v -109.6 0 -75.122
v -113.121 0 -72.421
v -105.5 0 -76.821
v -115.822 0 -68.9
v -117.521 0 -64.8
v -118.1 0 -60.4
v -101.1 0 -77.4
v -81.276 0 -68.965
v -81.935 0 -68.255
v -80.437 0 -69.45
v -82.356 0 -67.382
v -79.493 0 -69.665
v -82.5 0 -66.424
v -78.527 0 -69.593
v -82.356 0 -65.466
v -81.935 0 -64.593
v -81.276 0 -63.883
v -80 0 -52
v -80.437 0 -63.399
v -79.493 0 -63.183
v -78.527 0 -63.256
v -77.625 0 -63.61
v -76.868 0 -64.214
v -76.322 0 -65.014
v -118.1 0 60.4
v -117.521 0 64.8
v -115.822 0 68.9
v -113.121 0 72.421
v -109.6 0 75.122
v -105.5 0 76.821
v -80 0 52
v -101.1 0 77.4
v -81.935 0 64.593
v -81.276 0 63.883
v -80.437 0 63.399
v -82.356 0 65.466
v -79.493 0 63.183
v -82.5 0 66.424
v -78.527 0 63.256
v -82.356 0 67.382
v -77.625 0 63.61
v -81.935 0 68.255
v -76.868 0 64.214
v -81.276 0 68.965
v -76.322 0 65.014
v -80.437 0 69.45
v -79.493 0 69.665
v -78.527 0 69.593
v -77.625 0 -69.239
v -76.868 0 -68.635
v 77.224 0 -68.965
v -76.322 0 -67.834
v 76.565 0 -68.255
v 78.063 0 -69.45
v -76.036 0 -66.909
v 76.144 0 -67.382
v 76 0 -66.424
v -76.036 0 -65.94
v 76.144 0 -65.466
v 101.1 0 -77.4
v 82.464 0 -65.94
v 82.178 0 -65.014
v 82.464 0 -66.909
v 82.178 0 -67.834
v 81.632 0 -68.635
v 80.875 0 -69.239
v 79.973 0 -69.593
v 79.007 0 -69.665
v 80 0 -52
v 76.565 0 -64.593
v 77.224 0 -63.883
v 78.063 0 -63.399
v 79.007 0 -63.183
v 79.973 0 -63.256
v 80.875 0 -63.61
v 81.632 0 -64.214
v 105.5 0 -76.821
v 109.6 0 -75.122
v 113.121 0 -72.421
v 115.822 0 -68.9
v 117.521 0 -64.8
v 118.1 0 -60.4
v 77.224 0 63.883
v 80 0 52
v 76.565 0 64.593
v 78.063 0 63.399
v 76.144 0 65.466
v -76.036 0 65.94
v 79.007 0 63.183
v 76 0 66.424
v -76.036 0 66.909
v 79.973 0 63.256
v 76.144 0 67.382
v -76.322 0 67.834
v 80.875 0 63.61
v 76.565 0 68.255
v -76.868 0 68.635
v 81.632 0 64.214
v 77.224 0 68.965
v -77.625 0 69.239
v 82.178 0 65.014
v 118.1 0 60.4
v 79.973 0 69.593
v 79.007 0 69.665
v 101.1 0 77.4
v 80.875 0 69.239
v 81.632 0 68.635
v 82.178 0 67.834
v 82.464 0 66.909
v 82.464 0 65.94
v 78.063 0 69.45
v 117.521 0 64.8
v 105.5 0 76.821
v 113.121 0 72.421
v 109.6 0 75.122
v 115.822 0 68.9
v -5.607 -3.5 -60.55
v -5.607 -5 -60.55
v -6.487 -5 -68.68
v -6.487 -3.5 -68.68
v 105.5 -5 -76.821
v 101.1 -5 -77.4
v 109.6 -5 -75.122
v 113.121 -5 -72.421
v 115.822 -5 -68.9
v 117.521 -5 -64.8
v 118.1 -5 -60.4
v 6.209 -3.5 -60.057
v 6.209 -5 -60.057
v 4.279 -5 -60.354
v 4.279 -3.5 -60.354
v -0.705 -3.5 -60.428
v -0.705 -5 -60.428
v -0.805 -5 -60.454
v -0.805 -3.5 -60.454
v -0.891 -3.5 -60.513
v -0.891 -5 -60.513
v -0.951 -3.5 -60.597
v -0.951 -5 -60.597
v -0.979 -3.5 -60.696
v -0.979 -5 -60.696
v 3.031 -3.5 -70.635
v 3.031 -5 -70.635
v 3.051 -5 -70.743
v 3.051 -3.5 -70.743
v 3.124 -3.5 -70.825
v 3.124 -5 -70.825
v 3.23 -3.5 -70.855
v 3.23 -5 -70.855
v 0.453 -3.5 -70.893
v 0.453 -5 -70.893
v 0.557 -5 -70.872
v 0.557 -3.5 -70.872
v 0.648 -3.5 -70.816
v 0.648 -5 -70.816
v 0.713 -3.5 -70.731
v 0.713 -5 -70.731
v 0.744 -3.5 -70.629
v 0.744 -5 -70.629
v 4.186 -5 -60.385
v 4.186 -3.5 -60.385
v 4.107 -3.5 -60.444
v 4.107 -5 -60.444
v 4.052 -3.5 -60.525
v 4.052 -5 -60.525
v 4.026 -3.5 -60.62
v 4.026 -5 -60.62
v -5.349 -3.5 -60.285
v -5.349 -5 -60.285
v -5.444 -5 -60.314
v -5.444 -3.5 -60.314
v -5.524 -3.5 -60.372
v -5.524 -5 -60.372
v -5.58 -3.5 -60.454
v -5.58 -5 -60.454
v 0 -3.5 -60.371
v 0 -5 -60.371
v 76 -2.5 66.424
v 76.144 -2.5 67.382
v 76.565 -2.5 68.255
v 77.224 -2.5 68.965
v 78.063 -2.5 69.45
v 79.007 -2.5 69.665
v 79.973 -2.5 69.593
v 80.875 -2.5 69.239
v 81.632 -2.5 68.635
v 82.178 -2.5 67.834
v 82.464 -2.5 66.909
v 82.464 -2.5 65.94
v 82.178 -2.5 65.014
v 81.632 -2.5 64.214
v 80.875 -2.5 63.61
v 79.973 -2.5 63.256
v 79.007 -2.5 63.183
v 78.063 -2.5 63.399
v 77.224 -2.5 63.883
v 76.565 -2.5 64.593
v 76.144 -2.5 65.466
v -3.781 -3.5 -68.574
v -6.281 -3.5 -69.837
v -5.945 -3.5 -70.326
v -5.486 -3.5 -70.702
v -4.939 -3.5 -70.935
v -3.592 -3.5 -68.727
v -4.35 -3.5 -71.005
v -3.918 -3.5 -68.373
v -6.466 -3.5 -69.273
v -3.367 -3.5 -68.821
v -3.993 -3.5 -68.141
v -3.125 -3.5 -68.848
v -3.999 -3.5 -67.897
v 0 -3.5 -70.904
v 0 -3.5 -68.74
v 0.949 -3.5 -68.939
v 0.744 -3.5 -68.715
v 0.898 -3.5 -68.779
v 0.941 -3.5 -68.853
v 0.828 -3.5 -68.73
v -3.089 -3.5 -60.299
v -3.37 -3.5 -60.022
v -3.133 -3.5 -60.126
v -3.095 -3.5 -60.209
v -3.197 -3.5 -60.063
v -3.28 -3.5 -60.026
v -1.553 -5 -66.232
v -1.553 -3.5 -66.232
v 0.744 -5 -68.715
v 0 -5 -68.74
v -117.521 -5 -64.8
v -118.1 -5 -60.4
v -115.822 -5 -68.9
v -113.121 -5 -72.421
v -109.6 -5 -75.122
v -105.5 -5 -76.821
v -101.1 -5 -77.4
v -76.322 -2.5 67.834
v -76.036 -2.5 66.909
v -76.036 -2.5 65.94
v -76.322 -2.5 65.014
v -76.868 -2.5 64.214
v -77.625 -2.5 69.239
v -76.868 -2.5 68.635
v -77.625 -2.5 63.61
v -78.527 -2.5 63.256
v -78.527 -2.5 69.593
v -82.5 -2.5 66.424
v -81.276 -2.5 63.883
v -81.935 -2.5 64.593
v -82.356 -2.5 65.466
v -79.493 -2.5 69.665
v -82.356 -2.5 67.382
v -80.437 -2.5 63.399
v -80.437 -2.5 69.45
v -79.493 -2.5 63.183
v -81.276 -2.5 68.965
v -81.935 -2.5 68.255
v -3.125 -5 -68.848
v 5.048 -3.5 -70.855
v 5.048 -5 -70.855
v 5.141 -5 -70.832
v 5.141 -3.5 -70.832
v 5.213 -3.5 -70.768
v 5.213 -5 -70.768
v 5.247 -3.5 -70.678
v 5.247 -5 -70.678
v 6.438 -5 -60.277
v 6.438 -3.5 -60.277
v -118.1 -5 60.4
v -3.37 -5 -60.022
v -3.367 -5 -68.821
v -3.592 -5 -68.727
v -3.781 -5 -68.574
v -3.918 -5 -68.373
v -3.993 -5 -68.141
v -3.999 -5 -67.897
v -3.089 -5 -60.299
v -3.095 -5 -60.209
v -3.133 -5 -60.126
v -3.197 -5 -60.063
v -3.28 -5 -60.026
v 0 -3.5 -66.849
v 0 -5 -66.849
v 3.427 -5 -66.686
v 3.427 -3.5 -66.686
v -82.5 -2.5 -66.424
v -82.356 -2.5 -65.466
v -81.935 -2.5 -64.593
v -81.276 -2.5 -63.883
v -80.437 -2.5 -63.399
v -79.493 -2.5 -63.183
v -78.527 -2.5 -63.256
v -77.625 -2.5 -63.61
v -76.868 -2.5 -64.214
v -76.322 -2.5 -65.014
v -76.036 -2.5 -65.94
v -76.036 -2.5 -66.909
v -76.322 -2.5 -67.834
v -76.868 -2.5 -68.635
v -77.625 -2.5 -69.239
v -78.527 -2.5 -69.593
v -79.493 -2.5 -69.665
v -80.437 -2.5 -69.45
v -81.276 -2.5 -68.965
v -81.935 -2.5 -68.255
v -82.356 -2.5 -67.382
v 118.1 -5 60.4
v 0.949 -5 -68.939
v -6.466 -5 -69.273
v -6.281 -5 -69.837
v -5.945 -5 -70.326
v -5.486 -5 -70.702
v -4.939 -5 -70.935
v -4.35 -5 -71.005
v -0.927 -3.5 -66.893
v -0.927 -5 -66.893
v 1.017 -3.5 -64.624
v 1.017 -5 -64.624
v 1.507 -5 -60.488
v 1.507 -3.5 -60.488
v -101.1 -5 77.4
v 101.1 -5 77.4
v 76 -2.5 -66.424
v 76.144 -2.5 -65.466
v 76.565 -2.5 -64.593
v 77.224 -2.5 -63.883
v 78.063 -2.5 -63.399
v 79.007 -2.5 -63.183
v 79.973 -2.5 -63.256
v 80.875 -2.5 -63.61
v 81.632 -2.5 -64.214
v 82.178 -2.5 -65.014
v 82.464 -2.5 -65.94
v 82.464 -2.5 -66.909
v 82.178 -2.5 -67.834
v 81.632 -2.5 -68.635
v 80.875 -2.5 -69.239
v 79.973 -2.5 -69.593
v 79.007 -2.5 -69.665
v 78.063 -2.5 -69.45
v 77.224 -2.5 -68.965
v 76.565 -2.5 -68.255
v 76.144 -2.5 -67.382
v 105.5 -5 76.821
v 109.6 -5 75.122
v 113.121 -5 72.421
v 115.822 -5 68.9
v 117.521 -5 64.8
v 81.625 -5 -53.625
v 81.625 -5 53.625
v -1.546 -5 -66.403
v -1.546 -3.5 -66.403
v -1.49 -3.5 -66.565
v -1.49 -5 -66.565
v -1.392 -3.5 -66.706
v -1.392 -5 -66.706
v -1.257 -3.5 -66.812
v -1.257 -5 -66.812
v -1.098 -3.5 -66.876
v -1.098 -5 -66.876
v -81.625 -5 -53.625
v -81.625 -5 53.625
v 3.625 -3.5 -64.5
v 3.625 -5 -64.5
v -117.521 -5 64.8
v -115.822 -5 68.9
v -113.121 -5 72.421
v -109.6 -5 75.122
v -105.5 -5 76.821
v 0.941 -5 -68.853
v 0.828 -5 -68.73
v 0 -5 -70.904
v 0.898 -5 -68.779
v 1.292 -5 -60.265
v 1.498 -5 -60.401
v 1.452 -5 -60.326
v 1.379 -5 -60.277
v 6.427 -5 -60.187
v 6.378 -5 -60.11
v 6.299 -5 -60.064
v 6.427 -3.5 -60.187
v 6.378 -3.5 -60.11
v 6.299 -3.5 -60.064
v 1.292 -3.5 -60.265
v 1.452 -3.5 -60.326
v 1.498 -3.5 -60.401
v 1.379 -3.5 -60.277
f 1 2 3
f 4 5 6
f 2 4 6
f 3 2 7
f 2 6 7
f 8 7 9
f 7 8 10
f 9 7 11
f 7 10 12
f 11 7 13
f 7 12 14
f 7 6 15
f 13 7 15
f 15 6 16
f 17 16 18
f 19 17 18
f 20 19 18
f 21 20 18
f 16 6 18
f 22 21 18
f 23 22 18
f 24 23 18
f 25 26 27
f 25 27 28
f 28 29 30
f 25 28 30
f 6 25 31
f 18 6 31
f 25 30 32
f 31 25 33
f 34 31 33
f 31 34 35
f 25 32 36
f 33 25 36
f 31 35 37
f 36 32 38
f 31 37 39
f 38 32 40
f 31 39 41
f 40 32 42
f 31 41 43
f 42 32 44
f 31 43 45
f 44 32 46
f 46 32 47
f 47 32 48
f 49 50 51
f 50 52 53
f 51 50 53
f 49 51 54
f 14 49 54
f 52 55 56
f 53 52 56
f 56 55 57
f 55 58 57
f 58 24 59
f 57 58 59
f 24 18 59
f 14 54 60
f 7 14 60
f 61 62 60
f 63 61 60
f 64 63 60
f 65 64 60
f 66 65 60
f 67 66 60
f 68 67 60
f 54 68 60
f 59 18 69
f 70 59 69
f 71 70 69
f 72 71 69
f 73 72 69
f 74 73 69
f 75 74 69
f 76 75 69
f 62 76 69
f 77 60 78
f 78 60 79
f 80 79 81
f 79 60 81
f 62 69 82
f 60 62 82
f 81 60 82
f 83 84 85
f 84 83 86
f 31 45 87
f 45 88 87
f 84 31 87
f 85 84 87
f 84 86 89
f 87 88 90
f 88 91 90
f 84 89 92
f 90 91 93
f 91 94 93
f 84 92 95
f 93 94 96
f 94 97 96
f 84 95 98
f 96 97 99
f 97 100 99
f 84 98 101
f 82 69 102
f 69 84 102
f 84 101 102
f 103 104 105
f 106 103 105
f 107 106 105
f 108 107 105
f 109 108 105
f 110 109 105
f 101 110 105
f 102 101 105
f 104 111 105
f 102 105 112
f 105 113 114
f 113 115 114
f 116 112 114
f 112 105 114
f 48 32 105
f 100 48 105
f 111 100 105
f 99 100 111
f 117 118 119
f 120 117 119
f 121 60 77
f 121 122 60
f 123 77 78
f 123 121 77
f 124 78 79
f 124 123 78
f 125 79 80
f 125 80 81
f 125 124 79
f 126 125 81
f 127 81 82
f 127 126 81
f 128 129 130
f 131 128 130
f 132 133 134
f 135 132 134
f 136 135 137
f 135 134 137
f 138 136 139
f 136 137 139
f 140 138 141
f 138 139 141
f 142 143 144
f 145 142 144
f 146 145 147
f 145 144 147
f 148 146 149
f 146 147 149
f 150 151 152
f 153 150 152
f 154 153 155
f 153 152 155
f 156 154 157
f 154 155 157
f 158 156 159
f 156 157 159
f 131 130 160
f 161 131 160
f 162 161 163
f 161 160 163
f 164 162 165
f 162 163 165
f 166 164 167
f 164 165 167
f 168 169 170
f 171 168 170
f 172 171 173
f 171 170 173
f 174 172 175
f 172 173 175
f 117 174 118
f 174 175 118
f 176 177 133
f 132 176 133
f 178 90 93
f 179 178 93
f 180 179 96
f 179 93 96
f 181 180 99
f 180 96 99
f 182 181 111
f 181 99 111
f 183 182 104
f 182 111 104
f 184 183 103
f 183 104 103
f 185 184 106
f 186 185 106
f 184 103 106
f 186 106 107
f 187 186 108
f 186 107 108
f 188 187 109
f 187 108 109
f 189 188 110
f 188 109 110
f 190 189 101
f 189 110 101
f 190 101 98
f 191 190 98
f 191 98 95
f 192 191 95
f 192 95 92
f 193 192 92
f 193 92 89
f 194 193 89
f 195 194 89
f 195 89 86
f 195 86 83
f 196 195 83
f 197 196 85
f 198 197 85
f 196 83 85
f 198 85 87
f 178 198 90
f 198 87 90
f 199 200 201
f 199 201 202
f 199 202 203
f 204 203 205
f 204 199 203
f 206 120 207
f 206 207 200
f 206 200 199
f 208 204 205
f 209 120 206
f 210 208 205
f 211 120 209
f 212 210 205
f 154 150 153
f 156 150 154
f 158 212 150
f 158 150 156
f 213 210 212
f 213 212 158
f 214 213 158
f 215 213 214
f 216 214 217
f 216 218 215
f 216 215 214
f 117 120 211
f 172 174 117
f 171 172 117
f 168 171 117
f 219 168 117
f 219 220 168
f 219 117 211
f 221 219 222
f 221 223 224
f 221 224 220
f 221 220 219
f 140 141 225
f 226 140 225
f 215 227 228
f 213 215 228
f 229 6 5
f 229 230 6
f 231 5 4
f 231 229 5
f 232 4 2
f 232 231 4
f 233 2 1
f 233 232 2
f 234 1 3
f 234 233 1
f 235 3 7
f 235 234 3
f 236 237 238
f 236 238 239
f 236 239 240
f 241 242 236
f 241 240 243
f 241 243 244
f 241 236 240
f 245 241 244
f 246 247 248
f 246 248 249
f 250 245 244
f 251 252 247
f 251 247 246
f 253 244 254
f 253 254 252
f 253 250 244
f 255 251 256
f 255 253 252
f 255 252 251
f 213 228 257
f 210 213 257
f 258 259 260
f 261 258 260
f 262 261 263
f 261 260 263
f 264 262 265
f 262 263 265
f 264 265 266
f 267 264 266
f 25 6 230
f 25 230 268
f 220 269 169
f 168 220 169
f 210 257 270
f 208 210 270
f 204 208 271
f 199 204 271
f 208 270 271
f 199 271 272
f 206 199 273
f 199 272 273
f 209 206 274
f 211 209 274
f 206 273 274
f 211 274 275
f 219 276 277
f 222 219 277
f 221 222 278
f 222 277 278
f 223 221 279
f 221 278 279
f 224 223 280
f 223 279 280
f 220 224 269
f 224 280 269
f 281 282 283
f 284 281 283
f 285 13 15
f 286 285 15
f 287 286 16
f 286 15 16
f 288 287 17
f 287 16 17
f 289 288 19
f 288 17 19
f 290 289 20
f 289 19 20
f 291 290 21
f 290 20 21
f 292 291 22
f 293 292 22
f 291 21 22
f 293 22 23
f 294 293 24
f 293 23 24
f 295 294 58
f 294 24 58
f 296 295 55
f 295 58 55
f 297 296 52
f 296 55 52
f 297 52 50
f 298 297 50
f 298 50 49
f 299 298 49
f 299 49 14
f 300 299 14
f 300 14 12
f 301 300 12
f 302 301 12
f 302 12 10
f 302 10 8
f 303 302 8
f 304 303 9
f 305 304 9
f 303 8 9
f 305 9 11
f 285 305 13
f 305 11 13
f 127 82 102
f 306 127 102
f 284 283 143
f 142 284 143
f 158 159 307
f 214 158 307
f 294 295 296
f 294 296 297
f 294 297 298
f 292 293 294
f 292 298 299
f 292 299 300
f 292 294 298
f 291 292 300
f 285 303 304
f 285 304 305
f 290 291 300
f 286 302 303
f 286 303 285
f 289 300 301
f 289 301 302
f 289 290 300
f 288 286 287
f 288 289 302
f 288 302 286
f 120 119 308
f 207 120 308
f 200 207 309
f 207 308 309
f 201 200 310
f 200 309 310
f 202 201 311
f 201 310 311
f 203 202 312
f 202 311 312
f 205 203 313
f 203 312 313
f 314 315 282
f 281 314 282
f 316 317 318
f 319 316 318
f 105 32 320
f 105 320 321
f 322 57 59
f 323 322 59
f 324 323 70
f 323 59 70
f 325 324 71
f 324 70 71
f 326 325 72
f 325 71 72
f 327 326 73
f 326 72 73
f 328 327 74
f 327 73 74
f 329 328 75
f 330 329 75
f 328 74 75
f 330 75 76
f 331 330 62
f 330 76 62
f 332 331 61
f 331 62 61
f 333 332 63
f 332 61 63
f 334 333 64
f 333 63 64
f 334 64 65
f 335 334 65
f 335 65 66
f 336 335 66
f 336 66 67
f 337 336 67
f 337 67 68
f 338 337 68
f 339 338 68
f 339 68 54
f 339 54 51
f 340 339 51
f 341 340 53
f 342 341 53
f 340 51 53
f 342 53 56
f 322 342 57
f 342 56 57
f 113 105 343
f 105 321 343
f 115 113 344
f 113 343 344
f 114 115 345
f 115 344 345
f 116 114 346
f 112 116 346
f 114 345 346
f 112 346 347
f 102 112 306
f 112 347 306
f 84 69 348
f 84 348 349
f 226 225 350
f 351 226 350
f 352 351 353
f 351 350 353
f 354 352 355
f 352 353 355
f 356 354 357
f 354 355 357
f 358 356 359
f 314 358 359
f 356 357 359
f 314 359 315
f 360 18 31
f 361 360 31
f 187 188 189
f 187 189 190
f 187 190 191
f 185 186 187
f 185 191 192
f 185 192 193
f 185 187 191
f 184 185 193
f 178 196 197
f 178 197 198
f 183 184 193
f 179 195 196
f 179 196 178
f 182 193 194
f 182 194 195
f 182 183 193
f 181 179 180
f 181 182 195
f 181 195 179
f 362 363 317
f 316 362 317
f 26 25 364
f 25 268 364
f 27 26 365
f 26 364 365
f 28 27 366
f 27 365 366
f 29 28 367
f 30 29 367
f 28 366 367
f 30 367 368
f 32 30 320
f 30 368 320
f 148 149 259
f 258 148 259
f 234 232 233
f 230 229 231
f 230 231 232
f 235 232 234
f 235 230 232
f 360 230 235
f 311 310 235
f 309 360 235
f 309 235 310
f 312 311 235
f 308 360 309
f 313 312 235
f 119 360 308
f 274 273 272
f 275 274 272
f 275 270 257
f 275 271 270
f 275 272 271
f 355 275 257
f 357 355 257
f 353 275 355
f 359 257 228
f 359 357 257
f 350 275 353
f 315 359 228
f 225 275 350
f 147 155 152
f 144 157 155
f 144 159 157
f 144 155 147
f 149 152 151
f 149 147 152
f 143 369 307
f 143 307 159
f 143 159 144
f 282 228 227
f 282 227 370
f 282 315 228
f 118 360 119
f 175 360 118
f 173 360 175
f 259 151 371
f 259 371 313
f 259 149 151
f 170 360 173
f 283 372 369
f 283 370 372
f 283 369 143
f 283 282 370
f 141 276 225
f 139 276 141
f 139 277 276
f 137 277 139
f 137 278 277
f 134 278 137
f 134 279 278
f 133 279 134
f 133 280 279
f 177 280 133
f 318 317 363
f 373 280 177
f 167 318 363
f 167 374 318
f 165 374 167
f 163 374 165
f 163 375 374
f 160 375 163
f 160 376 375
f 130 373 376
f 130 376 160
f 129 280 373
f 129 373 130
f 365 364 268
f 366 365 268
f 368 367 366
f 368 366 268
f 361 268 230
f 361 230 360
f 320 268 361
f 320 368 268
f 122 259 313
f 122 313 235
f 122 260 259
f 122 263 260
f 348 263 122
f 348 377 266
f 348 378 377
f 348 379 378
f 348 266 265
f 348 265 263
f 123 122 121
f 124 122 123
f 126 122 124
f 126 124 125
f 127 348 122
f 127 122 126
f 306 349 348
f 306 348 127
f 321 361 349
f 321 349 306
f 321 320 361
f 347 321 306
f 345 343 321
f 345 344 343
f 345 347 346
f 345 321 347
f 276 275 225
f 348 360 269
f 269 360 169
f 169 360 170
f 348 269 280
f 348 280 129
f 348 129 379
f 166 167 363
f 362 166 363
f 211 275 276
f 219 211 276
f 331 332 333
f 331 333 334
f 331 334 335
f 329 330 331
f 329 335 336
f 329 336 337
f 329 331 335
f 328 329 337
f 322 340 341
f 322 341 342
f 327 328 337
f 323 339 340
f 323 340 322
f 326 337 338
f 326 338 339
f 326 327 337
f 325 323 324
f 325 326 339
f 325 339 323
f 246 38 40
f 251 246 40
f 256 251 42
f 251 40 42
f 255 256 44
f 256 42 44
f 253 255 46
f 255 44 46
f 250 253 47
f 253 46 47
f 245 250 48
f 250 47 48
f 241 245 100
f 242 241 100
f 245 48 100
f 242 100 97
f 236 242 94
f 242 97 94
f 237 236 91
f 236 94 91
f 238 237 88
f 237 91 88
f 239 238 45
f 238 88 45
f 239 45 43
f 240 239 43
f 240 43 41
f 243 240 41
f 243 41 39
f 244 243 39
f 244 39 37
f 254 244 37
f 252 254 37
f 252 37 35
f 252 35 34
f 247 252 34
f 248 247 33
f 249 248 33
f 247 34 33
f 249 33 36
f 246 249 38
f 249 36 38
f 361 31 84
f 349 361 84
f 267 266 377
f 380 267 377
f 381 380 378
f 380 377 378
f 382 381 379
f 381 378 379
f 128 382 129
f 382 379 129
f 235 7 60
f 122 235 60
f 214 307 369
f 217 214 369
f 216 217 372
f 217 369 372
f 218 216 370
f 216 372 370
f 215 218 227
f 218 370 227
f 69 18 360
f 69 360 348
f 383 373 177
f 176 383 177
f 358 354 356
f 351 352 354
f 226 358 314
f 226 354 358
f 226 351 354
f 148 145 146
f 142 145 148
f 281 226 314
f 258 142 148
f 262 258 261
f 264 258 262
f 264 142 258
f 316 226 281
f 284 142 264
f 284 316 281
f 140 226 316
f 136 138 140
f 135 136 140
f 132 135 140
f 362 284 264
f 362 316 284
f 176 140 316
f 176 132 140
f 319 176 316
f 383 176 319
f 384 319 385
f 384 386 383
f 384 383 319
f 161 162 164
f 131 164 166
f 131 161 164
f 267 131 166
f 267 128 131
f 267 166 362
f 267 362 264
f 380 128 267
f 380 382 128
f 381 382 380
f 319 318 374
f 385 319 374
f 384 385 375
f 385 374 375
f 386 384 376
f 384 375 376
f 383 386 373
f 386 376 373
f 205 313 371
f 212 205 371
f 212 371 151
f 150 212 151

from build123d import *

# Parameters (mm, degrees)
F0_W     = 236.2
F0_H     = 154.8
F0_W_2   = 160
F0_H_2   = 104
F1_DEPTH = 5
F2_R     = 17
F3_R     = 3.25
F4_DEPTH = 2.5
F5_SIZE2 = 4.99999
F5_SIZE  = 1.624588
F7_DEPTH = 1.5


# Not quite as in the source:
# - a fillet or chamfer is up to 0.001 mm smaller than in the source, because OpenCascade refuses the exact size


with BuildPart() as f1:
    # F0 (on Front) → F1 (new body)
    with BuildSketch(Plane.XZ):
        Rectangle(F0_W, F0_H)
        Rectangle(F0_W_2, F0_H_2, mode=Mode.SUBTRACT)
    extrude(amount=F1_DEPTH)

    # F2
    f2_edges = [f1.edges().sort_by_distance(p)[0] for p in [
        (-118.1, -2.5, 77.4),
        (118.1, -2.5, 77.4),
        (-118.1, -2.5, -77.4),
        (118.1, -2.5, -77.4),
    ]]
    fillet(f2_edges, radius=F2_R)

    # F3 (on face) → F4 (cut)
    with BuildSketch(Plane(origin=(0, 0, 0), x_dir=(-1, 0, 0), z_dir=(0, 1, 0))):
        with Locations((-79.25, 66.42428)):
            Circle(F3_R)
        with Locations((-79.25, -66.42428)):
            Circle(F3_R)
        with Locations((79.25, 66.42428)):
            Circle(F3_R)
        with Locations((79.25, -66.42428)):
            Circle(F3_R)
    extrude(amount=-F4_DEPTH, mode=Mode.SUBTRACT)

    # F5 (size 1.6245984812 and 5 in the source; OpenCascade refuses exactly that, so slightly less here)
    f5_edges = [f1.edges().sort_by_distance(p)[0] for p in [
        (-80, -5, 0),
        (0, -5, 52),
        (80, -5, 0),
        (0, -5, -52),
    ]]
    f5_side = f1.faces().sort_by_distance((0, -5, 74.575934))[0]
    chamfer(f5_edges, length=F5_SIZE, length2=F5_SIZE2, reference=f5_side)

    # F6 (on face) → F7 (cut)
    with BuildSketch(Plane.XZ.offset(5)):
        with BuildLine():
            Line((0, -70.9037960887), (0, -68.7403732376))
            Line((0, -68.7403732376), (-3.125376912, -68.8479899255))
            ThreePointArc((-3.125376912, -68.8479899255), (-3.7805726372, -68.5735525412), (-3.998605605, -67.897491197))
            Line((-3.998605605, -67.897491197), (-3.0892937711, -60.2992490469))
            ThreePointArc((-3.0892937711, -60.2992490469), (-3.1618997395, -60.0916194181), (-3.3704565536, -60.021721316))
            Line((-3.3704565536, -60.021721316), (-5.3485393199, -60.2845971301))
            ThreePointArc((-5.3485393199, -60.2845971301), (-5.5237209211, -60.3724524554), (-5.6072790976, -60.5497239497))
            Line((-5.6072790976, -60.5497239497), (-6.4865739197, -68.6796104252))
            ThreePointArc((-6.4865739197, -68.6796104252), (-5.9450748854, -70.3262933271), (-4.3499759171, -71.004854352))
            Line((-4.3499759171, -71.004854352), (0, -70.9037960887))
        make_face()
        with BuildLine():
            Line((1.2918589674, -60.2652083751), (0, -60.3707235945))
            Line((0, -60.3707235945), (0, -66.8485857862))
            Line((0, -66.8485857862), (3.4268085146, -66.6858144104))
            Line((3.4268085146, -66.6858144104), (3.0311800837, -70.6349397286))
            ThreePointArc((3.0311800837, -70.6349397286), (3.0818813973, -70.7890639463), (3.2301839467, -70.8548761904))
            Line((3.2301839467, -70.8548761904), (5.0478271442, -70.8548761904))
            ThreePointArc((5.0478271442, -70.8548761904), (5.1809587177, -70.8041276029), (5.2465278981, -70.6776360316))
            Line((5.2465278981, -70.6776360316), (6.4378099563, -60.2773594464))
            ThreePointArc((6.4378099563, -60.2773594464), (6.3777706296, -60.1104711604), (6.2086864979, -60.0569269995))
            Line((6.2086864979, -60.0569269995), (4.2790884308, -60.3539008339))
            ThreePointArc((4.2790884308, -60.3539008339), (4.1073828743, -60.4436163854), (4.0263119894, -60.6195686231))
            Line((4.0263119894, -60.6195686231), (3.6252996651, -64.4996576011))
            Line((3.6252996651, -64.4996576011), (1.0174442614, -64.6235291889))
            Line((1.0174442614, -64.6235291889), (1.506754727, -60.4880446531))
            ThreePointArc((1.506754727, -60.4880446531), (1.4521032332, -60.3257114675), (1.2918589674, -60.2652083751))
        make_face()
        with BuildLine():
            Line((0, -66.8485857862), (0, -60.3707235945))
            Line((0, -60.3707235945), (-0.7053982188, -60.4283384346))
            ThreePointArc((-0.7053982188, -60.4283384346), (-0.8907958695, -60.512923053), (-0.9793808578, -60.6964429332))
            Line((-0.9793808578, -60.6964429332), (-1.552537239, -66.2315062229))
            ThreePointArc((-1.552537239, -66.2315062229), (-1.3916459971, -66.7055871007), (-0.9272608372, -66.892630127))
            Line((-0.9272608372, -66.892630127), (0, -66.8485857862))
        make_face()
        with BuildLine():
            Line((0.7437746725, -68.7147627052), (0, -68.7403732376))
            Line((0, -68.7403732376), (0, -70.9037960887))
            Line((0, -70.9037960887), (0.4531291197, -70.8932690322))
            ThreePointArc((0.4531291197, -70.8932690322), (0.6476972416, -70.8155735275), (0.7439755724, -70.6294987347))
            Line((0.7439755724, -70.6294987347), (0.9491999954, -68.9387434307))
            ThreePointArc((0.9491999954, -68.9387434307), (0.8980521088, -68.7794601123), (0.7437746725, -68.7147627052))
        make_face()
    extrude(amount=-F7_DEPTH, mode=Mode.SUBTRACT)


solid = f1.part
